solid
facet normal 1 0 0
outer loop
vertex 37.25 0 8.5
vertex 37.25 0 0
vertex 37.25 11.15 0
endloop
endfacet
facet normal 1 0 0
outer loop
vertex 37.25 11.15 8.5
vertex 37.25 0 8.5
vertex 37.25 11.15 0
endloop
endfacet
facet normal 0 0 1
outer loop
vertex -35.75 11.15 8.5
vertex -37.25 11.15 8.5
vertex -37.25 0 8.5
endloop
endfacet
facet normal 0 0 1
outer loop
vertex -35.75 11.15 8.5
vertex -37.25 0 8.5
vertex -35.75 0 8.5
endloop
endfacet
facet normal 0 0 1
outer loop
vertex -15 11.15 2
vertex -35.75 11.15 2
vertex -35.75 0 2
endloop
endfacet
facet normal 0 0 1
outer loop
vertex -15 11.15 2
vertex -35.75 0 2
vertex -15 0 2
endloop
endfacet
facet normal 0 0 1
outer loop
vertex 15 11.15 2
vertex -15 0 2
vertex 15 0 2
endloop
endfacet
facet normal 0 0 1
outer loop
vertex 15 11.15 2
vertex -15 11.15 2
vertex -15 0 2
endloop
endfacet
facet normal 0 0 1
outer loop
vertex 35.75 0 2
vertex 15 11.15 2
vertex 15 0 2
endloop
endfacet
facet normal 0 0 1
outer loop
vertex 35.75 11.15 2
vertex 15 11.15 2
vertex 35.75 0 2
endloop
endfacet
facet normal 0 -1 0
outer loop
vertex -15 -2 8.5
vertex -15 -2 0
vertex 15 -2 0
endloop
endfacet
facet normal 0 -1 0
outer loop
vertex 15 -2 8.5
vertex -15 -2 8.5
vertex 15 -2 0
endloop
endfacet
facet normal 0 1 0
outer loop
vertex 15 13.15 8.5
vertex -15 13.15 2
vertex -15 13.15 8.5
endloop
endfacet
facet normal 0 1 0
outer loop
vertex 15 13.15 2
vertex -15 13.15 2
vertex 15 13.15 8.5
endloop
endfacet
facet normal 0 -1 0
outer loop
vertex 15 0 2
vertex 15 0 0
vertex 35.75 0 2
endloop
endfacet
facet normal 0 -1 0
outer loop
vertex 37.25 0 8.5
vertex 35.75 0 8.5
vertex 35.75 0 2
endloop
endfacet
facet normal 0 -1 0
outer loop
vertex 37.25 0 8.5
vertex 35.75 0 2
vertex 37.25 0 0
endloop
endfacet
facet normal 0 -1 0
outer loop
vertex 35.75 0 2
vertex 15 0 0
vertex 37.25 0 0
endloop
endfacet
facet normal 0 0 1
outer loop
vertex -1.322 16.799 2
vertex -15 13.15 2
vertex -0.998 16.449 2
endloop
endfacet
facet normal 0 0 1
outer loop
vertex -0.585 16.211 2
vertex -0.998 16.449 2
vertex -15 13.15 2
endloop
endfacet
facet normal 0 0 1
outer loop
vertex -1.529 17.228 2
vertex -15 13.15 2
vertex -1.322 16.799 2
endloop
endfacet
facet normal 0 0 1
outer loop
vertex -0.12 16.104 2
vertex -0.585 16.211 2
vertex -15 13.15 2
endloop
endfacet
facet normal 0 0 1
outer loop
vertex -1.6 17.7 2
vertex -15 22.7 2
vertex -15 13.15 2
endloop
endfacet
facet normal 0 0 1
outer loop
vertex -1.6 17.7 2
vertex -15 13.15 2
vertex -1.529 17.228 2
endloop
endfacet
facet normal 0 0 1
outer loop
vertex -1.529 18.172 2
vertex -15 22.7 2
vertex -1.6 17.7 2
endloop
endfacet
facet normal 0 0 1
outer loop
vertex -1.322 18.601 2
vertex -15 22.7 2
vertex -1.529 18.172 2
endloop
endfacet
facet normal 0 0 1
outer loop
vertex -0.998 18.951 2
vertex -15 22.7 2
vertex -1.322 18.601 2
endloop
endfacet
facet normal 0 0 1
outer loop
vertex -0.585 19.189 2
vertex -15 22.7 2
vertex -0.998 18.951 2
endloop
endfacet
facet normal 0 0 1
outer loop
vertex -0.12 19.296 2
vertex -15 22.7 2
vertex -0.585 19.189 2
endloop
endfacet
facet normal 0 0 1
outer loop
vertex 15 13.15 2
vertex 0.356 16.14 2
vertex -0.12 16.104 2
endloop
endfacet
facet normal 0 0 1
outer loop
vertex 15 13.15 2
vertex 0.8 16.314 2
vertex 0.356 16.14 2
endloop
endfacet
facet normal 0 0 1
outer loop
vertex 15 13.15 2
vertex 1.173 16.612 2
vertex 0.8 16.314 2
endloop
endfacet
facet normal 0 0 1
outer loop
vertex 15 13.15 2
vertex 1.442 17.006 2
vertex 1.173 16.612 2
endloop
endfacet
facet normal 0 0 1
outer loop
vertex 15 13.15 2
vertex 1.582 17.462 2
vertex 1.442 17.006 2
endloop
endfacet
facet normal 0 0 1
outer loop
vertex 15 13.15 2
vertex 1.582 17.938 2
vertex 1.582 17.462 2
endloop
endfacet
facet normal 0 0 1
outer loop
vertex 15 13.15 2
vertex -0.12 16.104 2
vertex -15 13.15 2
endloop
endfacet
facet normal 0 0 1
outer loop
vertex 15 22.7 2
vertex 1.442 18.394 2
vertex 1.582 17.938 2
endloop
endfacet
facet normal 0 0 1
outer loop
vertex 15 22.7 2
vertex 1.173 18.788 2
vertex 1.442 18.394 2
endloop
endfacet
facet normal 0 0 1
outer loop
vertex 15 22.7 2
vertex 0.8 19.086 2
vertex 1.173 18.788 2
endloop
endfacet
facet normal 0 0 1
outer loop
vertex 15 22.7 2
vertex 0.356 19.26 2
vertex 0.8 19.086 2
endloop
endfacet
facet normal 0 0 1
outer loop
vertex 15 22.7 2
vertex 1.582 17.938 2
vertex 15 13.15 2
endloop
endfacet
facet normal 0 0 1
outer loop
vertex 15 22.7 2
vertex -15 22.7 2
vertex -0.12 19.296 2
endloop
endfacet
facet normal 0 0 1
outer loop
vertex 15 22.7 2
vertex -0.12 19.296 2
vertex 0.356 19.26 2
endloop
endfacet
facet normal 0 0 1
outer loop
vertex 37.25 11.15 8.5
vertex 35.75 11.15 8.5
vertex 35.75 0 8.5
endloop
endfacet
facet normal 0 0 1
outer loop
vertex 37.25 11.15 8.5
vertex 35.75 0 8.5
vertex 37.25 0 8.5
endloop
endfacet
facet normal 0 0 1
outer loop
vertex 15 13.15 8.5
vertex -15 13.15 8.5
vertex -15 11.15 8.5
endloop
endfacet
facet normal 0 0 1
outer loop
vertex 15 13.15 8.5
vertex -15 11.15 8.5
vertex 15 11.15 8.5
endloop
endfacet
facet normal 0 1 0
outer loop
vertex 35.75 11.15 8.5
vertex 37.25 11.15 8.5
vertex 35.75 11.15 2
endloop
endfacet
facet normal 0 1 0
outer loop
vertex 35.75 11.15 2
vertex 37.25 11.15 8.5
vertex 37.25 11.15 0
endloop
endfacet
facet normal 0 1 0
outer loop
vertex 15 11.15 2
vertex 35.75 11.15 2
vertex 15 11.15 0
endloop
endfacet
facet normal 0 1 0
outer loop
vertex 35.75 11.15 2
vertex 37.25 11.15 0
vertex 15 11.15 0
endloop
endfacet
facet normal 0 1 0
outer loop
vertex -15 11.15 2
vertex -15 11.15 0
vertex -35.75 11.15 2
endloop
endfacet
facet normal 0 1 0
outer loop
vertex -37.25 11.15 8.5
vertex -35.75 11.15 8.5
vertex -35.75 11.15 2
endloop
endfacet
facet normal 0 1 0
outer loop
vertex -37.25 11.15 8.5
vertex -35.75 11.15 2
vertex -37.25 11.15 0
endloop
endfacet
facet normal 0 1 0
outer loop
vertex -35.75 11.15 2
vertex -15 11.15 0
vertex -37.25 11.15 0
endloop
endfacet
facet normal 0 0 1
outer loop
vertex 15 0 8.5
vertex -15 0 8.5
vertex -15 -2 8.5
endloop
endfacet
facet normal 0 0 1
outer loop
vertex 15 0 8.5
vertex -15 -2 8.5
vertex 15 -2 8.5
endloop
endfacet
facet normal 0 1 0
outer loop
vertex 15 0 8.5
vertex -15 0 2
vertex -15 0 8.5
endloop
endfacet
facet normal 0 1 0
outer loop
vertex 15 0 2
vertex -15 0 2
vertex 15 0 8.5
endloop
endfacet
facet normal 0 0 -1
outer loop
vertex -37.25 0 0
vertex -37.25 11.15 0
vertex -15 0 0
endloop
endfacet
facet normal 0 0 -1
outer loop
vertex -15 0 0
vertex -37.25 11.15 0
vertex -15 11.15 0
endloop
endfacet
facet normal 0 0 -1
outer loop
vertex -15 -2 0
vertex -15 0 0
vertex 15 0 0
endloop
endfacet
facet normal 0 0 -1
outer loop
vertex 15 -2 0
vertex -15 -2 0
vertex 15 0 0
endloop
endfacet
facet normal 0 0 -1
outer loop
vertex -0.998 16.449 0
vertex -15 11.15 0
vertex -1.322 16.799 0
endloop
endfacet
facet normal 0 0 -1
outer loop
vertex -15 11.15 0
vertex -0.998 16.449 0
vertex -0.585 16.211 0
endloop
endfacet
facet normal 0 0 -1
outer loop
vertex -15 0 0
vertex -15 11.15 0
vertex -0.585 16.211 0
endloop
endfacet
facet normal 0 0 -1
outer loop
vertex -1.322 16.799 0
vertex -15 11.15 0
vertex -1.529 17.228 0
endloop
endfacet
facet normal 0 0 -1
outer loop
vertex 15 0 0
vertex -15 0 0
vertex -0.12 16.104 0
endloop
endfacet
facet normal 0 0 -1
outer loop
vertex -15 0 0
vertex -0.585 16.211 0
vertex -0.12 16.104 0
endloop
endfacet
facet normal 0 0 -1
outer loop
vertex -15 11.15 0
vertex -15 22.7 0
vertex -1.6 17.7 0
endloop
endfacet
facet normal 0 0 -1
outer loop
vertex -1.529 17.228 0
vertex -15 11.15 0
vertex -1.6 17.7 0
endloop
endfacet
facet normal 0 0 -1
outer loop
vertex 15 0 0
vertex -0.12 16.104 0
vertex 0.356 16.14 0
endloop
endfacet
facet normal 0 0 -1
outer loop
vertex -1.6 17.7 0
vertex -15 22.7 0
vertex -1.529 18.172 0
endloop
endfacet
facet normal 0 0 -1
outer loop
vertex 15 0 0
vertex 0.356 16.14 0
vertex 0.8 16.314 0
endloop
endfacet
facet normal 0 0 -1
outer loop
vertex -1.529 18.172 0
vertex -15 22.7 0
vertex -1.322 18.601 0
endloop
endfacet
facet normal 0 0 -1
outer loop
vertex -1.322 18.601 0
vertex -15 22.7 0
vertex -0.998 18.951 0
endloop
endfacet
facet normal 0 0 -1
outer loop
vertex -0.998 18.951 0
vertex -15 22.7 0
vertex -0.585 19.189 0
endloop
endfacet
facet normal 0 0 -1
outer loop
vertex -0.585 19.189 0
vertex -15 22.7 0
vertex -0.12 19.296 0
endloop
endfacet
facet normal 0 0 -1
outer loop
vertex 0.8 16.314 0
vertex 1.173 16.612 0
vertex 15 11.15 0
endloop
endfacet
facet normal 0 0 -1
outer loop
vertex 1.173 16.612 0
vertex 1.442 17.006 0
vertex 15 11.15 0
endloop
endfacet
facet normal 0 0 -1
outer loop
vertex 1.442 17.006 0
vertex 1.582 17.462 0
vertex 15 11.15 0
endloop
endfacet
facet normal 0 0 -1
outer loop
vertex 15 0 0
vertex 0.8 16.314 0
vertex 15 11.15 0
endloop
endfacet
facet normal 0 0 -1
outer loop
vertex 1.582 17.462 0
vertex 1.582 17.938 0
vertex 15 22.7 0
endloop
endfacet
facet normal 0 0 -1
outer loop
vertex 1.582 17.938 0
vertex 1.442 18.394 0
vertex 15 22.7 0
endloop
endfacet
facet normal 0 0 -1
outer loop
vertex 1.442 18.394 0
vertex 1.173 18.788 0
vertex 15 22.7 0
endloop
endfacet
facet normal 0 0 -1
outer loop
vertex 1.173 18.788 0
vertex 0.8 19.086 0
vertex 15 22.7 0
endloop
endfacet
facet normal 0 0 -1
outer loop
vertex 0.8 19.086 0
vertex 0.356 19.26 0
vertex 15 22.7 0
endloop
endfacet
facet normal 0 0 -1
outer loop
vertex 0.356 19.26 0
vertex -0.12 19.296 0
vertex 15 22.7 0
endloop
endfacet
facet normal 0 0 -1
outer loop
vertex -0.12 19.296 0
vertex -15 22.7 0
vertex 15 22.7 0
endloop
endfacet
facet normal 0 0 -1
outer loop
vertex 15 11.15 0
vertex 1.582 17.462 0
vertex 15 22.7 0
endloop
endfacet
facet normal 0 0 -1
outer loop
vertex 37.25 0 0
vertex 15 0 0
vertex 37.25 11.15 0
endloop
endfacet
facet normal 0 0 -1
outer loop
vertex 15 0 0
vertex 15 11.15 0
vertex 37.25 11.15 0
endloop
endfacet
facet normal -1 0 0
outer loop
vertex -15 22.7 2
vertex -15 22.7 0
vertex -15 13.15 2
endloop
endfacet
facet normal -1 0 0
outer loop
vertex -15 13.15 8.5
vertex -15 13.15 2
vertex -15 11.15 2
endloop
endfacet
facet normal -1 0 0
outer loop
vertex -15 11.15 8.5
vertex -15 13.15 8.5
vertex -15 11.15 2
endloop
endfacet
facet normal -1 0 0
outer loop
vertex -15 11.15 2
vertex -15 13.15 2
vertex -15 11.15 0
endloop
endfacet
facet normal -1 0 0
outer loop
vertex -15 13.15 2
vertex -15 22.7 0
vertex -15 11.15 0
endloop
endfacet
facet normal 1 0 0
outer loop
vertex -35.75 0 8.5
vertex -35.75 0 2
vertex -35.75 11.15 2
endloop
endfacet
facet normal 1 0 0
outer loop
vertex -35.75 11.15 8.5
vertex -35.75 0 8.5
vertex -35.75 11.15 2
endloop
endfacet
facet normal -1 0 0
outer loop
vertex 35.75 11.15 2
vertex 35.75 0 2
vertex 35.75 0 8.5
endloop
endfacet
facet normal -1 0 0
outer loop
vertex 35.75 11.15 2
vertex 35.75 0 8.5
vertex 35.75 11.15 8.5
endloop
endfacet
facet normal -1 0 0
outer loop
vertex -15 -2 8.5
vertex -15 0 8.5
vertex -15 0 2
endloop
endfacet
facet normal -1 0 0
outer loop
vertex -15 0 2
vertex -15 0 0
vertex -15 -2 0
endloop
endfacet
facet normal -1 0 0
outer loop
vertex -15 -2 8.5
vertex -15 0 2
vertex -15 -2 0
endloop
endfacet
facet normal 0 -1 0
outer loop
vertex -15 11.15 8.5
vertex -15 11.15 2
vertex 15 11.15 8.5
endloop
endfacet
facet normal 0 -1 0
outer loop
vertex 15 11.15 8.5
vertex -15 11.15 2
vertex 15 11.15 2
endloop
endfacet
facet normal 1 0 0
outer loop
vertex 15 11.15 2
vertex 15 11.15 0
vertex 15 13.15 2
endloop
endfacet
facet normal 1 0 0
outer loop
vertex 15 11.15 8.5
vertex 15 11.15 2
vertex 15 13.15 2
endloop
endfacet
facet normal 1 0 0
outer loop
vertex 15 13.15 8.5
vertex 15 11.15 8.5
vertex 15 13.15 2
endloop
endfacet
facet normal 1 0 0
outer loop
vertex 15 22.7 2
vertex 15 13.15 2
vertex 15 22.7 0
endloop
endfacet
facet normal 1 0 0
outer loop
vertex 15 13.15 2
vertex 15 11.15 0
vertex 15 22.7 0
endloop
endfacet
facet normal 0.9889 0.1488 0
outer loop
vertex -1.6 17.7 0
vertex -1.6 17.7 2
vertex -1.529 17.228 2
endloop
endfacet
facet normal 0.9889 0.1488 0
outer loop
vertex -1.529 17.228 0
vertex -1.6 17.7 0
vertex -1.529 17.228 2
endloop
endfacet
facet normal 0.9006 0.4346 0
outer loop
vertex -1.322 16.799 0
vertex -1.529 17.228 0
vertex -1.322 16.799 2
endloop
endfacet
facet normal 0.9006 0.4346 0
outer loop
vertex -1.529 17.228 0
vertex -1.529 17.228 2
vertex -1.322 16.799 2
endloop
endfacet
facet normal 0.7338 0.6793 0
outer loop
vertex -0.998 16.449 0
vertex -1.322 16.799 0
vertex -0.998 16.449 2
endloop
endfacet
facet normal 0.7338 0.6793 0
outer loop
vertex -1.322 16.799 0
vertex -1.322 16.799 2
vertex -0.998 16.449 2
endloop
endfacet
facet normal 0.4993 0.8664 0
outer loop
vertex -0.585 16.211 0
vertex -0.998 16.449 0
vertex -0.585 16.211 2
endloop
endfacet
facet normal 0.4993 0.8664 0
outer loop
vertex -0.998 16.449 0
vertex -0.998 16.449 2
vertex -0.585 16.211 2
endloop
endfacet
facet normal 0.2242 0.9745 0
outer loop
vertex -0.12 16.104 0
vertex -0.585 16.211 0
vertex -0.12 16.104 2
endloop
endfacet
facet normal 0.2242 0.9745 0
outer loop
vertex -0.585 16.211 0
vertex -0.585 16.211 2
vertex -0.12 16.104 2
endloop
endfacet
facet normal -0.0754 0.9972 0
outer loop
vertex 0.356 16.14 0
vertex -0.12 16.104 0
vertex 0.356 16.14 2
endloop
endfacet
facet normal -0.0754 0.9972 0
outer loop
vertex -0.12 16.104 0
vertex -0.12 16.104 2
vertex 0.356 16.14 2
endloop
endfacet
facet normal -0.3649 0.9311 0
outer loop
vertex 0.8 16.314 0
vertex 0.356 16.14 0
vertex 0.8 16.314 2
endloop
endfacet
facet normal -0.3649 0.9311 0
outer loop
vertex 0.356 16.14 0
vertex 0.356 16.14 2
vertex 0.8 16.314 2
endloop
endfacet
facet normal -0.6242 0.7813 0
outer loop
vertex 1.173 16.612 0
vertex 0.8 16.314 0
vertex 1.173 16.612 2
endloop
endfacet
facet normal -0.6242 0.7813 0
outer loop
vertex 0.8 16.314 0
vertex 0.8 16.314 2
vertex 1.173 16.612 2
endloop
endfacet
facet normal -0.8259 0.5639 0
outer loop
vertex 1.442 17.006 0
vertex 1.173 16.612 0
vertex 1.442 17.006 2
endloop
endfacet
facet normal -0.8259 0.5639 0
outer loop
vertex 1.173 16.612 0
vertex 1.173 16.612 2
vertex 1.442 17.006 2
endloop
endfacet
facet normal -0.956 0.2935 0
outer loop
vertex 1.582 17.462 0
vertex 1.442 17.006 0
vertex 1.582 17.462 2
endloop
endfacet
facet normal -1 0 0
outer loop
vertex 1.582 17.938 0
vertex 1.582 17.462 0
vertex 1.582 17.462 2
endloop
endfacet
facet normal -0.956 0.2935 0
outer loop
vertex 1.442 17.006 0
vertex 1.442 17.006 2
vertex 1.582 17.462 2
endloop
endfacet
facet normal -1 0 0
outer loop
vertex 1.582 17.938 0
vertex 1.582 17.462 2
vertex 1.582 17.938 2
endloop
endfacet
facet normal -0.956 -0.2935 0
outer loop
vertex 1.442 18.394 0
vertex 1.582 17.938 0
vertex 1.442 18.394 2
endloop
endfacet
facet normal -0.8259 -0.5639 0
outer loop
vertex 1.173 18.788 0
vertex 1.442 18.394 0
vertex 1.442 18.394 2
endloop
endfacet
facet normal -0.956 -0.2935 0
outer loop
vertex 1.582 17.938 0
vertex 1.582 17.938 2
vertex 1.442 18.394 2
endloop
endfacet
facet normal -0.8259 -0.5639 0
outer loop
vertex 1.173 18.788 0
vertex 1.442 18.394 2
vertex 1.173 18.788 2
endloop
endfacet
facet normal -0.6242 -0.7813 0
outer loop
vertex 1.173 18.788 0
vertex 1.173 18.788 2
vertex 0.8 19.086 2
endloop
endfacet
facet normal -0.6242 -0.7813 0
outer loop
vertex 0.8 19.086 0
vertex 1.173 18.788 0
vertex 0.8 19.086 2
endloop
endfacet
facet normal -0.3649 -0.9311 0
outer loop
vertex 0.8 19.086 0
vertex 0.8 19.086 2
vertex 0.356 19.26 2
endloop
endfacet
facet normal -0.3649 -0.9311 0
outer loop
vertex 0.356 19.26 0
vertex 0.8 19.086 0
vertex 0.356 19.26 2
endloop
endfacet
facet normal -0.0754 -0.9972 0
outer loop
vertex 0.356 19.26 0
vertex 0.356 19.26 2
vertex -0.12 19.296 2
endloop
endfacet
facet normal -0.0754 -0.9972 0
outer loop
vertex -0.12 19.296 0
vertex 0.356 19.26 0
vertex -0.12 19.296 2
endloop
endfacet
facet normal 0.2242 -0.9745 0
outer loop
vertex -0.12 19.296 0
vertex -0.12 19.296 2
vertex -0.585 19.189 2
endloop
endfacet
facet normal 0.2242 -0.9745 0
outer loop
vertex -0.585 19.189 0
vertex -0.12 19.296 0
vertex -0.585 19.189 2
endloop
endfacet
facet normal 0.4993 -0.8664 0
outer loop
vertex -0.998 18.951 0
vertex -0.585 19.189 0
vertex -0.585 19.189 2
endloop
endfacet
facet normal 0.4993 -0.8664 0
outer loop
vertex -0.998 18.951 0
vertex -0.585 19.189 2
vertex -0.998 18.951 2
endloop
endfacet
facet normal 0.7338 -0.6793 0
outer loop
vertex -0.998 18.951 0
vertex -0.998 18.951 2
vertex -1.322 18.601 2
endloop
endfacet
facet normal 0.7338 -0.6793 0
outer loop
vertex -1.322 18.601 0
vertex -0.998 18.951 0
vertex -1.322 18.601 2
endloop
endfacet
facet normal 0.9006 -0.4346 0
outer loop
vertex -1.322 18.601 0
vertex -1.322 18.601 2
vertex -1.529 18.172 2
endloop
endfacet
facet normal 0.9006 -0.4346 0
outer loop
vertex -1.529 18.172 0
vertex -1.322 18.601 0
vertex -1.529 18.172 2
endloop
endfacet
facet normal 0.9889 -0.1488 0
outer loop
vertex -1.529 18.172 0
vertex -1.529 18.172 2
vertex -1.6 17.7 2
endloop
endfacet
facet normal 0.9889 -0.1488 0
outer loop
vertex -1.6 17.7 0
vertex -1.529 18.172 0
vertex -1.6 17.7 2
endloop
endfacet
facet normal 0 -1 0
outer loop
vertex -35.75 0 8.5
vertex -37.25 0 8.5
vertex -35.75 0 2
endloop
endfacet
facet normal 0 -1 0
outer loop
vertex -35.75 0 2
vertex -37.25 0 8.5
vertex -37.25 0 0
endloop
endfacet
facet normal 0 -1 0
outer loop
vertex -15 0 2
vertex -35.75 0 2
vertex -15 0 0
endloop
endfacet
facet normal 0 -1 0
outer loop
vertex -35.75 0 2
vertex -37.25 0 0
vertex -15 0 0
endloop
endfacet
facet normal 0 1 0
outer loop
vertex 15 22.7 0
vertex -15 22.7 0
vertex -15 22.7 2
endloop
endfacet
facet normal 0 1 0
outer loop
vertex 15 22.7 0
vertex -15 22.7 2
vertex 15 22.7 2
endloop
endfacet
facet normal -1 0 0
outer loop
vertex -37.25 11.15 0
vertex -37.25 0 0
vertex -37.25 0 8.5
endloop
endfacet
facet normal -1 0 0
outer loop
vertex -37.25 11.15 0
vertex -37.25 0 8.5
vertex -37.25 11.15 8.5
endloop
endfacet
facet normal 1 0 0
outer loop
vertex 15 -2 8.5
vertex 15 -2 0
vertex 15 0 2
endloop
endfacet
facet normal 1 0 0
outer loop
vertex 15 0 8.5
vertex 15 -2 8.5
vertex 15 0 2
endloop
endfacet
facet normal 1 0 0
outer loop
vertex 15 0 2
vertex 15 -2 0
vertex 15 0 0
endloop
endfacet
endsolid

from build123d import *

# Parameters (mm, degrees)
F0_W     = 30
F0_H     = 9.55
F0_H_2   = 2
F0_H_3   = 11.15
F0_W_2   = 1.5
F0_W_3   = 20.75
F1_DEPTH = 2
F2_DEPTH = 8.5
F3_D     = 3.2


with BuildPart() as f1:
    # F0 (on Top) → F1 (new body)
    with BuildSketch(Plane.XY):
        with Locations((0, 17.925)):
            Rectangle(F0_W, F0_H)
        with Locations((0, 12.15)):
            Rectangle(F0_W, F0_H_2)
        with Locations((0, 5.575)):
            Rectangle(F0_W, F0_H_3)
        with Locations((0, -1)):
            Rectangle(F0_W, F0_H_2)
        with Locations((-36.5, 5.575)):
            Rectangle(F0_W_2, F0_H_3)
        with Locations((-25.375, 5.575)):
            Rectangle(F0_W_3, F0_H_3)
        with Locations((25.375, 5.575)):
            Rectangle(F0_W_3, F0_H_3)
        with Locations((36.5, 5.575)):
            Rectangle(F0_W_2, F0_H_3)
    extrude(amount=F1_DEPTH)

    # F0 (on Top) → F2 (join)
    with BuildSketch(Plane.XY):
        with Locations((0, 12.15)):
            Rectangle(F0_W, F0_H_2)
        with Locations((0, -1)):
            Rectangle(F0_W, F0_H_2)
        with Locations((-36.5, 5.575)):
            Rectangle(F0_W_2, F0_H_3)
        with Locations((36.5, 5.575)):
            Rectangle(F0_W_2, F0_H_3)
    extrude(amount=F2_DEPTH)

    # F3 (through all)
    with Locations(Plane(origin=(0, 0, 0), x_dir=(1, 0, 0), z_dir=(0, 0, -1))):
        with Locations((0, -17.7)):
            Hole(F3_D / 2)


solid = f1.part
